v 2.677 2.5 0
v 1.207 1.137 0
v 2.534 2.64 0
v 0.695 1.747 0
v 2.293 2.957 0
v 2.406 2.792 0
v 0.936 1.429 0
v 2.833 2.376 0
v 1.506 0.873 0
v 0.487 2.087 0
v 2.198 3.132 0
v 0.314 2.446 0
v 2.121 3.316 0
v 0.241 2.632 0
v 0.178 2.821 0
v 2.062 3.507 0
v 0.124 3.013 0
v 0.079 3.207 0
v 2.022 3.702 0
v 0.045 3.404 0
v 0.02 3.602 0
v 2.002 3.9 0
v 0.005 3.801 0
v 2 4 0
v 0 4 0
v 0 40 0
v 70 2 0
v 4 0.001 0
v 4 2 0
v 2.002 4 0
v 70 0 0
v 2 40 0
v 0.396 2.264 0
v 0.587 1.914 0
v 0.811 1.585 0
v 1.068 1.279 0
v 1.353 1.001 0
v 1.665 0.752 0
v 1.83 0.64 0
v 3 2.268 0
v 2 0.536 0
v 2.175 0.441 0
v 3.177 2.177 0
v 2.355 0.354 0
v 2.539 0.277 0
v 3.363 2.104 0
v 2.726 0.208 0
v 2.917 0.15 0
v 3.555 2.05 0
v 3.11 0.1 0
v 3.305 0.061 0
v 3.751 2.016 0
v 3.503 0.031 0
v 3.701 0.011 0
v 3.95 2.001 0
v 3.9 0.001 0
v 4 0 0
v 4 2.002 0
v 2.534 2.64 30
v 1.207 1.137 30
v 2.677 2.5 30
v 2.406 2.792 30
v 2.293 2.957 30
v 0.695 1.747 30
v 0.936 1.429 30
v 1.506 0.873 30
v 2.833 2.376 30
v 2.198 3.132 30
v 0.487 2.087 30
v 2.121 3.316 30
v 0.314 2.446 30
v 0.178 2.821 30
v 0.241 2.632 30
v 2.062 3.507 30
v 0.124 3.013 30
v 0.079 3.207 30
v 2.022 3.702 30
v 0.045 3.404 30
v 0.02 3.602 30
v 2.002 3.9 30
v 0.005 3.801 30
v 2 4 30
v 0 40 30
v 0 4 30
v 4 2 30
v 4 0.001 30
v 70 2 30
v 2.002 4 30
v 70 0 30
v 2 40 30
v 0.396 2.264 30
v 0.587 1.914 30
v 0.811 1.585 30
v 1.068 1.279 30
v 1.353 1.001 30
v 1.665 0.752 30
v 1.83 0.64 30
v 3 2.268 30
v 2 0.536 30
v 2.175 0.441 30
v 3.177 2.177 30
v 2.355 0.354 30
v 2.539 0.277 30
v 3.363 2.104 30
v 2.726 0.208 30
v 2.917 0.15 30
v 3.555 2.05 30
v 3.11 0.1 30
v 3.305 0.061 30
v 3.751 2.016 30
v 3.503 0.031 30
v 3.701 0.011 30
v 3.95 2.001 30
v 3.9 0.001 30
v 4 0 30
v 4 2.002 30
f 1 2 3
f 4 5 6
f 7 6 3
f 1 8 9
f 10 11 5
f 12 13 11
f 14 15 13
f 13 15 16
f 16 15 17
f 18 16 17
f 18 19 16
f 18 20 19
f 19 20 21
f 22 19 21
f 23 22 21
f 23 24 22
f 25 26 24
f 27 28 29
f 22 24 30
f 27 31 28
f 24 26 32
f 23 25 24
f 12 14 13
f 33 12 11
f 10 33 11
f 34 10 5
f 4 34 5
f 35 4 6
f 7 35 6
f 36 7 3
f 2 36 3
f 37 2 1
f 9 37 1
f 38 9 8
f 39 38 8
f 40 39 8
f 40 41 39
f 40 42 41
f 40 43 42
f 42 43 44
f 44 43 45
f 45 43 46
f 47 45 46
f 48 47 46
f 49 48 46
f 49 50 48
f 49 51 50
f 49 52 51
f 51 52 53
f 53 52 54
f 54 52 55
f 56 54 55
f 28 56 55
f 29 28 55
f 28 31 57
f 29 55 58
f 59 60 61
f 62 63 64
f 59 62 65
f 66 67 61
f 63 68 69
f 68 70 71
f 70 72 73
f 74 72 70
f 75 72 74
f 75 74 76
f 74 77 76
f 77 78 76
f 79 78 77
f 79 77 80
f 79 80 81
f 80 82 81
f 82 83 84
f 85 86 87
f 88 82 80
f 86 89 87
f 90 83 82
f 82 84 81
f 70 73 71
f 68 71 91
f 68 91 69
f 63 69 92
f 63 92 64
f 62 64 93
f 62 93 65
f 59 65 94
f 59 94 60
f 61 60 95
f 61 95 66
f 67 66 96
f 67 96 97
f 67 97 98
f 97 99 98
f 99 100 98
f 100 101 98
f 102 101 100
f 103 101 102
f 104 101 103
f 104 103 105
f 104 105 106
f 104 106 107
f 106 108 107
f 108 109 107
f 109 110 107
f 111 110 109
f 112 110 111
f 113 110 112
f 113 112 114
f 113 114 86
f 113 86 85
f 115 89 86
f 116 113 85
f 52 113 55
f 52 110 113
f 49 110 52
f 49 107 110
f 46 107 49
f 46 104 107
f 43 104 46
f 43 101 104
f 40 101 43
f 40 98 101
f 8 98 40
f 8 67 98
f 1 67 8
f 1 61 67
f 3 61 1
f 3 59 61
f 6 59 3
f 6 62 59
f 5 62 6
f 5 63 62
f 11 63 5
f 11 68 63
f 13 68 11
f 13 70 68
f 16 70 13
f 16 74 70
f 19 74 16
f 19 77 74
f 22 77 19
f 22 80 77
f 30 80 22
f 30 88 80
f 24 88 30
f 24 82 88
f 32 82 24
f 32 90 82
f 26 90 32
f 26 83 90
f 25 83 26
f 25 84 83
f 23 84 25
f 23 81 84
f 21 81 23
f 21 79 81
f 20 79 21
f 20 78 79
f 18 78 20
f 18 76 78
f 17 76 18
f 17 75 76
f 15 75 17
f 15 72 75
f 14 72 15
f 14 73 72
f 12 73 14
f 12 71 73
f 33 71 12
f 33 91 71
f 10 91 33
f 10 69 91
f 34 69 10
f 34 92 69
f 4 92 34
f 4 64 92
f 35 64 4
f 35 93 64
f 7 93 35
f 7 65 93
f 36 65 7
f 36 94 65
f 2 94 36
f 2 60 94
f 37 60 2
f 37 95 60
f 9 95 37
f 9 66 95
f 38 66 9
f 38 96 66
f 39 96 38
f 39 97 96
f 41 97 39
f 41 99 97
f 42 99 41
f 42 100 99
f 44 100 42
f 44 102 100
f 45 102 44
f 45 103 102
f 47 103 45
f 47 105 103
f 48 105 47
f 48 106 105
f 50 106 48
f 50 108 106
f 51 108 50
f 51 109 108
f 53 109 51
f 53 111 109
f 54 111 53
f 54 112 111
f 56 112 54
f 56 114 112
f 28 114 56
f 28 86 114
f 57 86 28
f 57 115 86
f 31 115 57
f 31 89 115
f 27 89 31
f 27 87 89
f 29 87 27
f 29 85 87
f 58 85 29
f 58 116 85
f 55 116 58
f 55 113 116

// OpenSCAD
flange_a_outside_mm = 70;
flange_b_outside_mm = 40;
width_mm = 30;
thickness_mm = 2.0;
inside_radius_mm = 2.0;
bend_angle_deg = 90;
k_factor = 0.45;

bend_angle_rad = bend_angle_deg * PI / 180;
outside_setback_mm = (inside_radius_mm + thickness_mm) * tan(bend_angle_deg / 2);
bend_allowance_mm = bend_angle_rad * (inside_radius_mm + k_factor * thickness_mm);
flat_length_mm = flange_a_outside_mm + flange_b_outside_mm - (2 * outside_setback_mm - bend_allowance_mm);

outer_radius_mm = inside_radius_mm + thickness_mm;
bend_center = [outer_radius_mm, outer_radius_mm];

$fa = 2;
$fs = 0.2;

echo(str(
    "MAKERBENCH-SHEETMETAL: {",
    "\"thickness_mm\": ", thickness_mm,
    ", \"bend_radius_mm\": ", inside_radius_mm,
    ", \"flat_length_mm\": ", flat_length_mm,
    "}"
));

module bend_sector_2d() {
    translate(bend_center)
    intersection() {
        difference() {
            circle(r = outer_radius_mm);
            circle(r = inside_radius_mm);
        }
        translate([-outer_radius_mm, -outer_radius_mm])
            square([outer_radius_mm, outer_radius_mm]);
    }
}

module bracket_profile_2d() {
    union() {
        translate([outer_radius_mm, 0])
            square([flange_a_outside_mm - outer_radius_mm, thickness_mm]);

        translate([0, outer_radius_mm])
            square([thickness_mm, flange_b_outside_mm - outer_radius_mm]);

        bend_sector_2d();
    }
}

linear_extrude(height = width_mm)
    bracket_profile_2d();
